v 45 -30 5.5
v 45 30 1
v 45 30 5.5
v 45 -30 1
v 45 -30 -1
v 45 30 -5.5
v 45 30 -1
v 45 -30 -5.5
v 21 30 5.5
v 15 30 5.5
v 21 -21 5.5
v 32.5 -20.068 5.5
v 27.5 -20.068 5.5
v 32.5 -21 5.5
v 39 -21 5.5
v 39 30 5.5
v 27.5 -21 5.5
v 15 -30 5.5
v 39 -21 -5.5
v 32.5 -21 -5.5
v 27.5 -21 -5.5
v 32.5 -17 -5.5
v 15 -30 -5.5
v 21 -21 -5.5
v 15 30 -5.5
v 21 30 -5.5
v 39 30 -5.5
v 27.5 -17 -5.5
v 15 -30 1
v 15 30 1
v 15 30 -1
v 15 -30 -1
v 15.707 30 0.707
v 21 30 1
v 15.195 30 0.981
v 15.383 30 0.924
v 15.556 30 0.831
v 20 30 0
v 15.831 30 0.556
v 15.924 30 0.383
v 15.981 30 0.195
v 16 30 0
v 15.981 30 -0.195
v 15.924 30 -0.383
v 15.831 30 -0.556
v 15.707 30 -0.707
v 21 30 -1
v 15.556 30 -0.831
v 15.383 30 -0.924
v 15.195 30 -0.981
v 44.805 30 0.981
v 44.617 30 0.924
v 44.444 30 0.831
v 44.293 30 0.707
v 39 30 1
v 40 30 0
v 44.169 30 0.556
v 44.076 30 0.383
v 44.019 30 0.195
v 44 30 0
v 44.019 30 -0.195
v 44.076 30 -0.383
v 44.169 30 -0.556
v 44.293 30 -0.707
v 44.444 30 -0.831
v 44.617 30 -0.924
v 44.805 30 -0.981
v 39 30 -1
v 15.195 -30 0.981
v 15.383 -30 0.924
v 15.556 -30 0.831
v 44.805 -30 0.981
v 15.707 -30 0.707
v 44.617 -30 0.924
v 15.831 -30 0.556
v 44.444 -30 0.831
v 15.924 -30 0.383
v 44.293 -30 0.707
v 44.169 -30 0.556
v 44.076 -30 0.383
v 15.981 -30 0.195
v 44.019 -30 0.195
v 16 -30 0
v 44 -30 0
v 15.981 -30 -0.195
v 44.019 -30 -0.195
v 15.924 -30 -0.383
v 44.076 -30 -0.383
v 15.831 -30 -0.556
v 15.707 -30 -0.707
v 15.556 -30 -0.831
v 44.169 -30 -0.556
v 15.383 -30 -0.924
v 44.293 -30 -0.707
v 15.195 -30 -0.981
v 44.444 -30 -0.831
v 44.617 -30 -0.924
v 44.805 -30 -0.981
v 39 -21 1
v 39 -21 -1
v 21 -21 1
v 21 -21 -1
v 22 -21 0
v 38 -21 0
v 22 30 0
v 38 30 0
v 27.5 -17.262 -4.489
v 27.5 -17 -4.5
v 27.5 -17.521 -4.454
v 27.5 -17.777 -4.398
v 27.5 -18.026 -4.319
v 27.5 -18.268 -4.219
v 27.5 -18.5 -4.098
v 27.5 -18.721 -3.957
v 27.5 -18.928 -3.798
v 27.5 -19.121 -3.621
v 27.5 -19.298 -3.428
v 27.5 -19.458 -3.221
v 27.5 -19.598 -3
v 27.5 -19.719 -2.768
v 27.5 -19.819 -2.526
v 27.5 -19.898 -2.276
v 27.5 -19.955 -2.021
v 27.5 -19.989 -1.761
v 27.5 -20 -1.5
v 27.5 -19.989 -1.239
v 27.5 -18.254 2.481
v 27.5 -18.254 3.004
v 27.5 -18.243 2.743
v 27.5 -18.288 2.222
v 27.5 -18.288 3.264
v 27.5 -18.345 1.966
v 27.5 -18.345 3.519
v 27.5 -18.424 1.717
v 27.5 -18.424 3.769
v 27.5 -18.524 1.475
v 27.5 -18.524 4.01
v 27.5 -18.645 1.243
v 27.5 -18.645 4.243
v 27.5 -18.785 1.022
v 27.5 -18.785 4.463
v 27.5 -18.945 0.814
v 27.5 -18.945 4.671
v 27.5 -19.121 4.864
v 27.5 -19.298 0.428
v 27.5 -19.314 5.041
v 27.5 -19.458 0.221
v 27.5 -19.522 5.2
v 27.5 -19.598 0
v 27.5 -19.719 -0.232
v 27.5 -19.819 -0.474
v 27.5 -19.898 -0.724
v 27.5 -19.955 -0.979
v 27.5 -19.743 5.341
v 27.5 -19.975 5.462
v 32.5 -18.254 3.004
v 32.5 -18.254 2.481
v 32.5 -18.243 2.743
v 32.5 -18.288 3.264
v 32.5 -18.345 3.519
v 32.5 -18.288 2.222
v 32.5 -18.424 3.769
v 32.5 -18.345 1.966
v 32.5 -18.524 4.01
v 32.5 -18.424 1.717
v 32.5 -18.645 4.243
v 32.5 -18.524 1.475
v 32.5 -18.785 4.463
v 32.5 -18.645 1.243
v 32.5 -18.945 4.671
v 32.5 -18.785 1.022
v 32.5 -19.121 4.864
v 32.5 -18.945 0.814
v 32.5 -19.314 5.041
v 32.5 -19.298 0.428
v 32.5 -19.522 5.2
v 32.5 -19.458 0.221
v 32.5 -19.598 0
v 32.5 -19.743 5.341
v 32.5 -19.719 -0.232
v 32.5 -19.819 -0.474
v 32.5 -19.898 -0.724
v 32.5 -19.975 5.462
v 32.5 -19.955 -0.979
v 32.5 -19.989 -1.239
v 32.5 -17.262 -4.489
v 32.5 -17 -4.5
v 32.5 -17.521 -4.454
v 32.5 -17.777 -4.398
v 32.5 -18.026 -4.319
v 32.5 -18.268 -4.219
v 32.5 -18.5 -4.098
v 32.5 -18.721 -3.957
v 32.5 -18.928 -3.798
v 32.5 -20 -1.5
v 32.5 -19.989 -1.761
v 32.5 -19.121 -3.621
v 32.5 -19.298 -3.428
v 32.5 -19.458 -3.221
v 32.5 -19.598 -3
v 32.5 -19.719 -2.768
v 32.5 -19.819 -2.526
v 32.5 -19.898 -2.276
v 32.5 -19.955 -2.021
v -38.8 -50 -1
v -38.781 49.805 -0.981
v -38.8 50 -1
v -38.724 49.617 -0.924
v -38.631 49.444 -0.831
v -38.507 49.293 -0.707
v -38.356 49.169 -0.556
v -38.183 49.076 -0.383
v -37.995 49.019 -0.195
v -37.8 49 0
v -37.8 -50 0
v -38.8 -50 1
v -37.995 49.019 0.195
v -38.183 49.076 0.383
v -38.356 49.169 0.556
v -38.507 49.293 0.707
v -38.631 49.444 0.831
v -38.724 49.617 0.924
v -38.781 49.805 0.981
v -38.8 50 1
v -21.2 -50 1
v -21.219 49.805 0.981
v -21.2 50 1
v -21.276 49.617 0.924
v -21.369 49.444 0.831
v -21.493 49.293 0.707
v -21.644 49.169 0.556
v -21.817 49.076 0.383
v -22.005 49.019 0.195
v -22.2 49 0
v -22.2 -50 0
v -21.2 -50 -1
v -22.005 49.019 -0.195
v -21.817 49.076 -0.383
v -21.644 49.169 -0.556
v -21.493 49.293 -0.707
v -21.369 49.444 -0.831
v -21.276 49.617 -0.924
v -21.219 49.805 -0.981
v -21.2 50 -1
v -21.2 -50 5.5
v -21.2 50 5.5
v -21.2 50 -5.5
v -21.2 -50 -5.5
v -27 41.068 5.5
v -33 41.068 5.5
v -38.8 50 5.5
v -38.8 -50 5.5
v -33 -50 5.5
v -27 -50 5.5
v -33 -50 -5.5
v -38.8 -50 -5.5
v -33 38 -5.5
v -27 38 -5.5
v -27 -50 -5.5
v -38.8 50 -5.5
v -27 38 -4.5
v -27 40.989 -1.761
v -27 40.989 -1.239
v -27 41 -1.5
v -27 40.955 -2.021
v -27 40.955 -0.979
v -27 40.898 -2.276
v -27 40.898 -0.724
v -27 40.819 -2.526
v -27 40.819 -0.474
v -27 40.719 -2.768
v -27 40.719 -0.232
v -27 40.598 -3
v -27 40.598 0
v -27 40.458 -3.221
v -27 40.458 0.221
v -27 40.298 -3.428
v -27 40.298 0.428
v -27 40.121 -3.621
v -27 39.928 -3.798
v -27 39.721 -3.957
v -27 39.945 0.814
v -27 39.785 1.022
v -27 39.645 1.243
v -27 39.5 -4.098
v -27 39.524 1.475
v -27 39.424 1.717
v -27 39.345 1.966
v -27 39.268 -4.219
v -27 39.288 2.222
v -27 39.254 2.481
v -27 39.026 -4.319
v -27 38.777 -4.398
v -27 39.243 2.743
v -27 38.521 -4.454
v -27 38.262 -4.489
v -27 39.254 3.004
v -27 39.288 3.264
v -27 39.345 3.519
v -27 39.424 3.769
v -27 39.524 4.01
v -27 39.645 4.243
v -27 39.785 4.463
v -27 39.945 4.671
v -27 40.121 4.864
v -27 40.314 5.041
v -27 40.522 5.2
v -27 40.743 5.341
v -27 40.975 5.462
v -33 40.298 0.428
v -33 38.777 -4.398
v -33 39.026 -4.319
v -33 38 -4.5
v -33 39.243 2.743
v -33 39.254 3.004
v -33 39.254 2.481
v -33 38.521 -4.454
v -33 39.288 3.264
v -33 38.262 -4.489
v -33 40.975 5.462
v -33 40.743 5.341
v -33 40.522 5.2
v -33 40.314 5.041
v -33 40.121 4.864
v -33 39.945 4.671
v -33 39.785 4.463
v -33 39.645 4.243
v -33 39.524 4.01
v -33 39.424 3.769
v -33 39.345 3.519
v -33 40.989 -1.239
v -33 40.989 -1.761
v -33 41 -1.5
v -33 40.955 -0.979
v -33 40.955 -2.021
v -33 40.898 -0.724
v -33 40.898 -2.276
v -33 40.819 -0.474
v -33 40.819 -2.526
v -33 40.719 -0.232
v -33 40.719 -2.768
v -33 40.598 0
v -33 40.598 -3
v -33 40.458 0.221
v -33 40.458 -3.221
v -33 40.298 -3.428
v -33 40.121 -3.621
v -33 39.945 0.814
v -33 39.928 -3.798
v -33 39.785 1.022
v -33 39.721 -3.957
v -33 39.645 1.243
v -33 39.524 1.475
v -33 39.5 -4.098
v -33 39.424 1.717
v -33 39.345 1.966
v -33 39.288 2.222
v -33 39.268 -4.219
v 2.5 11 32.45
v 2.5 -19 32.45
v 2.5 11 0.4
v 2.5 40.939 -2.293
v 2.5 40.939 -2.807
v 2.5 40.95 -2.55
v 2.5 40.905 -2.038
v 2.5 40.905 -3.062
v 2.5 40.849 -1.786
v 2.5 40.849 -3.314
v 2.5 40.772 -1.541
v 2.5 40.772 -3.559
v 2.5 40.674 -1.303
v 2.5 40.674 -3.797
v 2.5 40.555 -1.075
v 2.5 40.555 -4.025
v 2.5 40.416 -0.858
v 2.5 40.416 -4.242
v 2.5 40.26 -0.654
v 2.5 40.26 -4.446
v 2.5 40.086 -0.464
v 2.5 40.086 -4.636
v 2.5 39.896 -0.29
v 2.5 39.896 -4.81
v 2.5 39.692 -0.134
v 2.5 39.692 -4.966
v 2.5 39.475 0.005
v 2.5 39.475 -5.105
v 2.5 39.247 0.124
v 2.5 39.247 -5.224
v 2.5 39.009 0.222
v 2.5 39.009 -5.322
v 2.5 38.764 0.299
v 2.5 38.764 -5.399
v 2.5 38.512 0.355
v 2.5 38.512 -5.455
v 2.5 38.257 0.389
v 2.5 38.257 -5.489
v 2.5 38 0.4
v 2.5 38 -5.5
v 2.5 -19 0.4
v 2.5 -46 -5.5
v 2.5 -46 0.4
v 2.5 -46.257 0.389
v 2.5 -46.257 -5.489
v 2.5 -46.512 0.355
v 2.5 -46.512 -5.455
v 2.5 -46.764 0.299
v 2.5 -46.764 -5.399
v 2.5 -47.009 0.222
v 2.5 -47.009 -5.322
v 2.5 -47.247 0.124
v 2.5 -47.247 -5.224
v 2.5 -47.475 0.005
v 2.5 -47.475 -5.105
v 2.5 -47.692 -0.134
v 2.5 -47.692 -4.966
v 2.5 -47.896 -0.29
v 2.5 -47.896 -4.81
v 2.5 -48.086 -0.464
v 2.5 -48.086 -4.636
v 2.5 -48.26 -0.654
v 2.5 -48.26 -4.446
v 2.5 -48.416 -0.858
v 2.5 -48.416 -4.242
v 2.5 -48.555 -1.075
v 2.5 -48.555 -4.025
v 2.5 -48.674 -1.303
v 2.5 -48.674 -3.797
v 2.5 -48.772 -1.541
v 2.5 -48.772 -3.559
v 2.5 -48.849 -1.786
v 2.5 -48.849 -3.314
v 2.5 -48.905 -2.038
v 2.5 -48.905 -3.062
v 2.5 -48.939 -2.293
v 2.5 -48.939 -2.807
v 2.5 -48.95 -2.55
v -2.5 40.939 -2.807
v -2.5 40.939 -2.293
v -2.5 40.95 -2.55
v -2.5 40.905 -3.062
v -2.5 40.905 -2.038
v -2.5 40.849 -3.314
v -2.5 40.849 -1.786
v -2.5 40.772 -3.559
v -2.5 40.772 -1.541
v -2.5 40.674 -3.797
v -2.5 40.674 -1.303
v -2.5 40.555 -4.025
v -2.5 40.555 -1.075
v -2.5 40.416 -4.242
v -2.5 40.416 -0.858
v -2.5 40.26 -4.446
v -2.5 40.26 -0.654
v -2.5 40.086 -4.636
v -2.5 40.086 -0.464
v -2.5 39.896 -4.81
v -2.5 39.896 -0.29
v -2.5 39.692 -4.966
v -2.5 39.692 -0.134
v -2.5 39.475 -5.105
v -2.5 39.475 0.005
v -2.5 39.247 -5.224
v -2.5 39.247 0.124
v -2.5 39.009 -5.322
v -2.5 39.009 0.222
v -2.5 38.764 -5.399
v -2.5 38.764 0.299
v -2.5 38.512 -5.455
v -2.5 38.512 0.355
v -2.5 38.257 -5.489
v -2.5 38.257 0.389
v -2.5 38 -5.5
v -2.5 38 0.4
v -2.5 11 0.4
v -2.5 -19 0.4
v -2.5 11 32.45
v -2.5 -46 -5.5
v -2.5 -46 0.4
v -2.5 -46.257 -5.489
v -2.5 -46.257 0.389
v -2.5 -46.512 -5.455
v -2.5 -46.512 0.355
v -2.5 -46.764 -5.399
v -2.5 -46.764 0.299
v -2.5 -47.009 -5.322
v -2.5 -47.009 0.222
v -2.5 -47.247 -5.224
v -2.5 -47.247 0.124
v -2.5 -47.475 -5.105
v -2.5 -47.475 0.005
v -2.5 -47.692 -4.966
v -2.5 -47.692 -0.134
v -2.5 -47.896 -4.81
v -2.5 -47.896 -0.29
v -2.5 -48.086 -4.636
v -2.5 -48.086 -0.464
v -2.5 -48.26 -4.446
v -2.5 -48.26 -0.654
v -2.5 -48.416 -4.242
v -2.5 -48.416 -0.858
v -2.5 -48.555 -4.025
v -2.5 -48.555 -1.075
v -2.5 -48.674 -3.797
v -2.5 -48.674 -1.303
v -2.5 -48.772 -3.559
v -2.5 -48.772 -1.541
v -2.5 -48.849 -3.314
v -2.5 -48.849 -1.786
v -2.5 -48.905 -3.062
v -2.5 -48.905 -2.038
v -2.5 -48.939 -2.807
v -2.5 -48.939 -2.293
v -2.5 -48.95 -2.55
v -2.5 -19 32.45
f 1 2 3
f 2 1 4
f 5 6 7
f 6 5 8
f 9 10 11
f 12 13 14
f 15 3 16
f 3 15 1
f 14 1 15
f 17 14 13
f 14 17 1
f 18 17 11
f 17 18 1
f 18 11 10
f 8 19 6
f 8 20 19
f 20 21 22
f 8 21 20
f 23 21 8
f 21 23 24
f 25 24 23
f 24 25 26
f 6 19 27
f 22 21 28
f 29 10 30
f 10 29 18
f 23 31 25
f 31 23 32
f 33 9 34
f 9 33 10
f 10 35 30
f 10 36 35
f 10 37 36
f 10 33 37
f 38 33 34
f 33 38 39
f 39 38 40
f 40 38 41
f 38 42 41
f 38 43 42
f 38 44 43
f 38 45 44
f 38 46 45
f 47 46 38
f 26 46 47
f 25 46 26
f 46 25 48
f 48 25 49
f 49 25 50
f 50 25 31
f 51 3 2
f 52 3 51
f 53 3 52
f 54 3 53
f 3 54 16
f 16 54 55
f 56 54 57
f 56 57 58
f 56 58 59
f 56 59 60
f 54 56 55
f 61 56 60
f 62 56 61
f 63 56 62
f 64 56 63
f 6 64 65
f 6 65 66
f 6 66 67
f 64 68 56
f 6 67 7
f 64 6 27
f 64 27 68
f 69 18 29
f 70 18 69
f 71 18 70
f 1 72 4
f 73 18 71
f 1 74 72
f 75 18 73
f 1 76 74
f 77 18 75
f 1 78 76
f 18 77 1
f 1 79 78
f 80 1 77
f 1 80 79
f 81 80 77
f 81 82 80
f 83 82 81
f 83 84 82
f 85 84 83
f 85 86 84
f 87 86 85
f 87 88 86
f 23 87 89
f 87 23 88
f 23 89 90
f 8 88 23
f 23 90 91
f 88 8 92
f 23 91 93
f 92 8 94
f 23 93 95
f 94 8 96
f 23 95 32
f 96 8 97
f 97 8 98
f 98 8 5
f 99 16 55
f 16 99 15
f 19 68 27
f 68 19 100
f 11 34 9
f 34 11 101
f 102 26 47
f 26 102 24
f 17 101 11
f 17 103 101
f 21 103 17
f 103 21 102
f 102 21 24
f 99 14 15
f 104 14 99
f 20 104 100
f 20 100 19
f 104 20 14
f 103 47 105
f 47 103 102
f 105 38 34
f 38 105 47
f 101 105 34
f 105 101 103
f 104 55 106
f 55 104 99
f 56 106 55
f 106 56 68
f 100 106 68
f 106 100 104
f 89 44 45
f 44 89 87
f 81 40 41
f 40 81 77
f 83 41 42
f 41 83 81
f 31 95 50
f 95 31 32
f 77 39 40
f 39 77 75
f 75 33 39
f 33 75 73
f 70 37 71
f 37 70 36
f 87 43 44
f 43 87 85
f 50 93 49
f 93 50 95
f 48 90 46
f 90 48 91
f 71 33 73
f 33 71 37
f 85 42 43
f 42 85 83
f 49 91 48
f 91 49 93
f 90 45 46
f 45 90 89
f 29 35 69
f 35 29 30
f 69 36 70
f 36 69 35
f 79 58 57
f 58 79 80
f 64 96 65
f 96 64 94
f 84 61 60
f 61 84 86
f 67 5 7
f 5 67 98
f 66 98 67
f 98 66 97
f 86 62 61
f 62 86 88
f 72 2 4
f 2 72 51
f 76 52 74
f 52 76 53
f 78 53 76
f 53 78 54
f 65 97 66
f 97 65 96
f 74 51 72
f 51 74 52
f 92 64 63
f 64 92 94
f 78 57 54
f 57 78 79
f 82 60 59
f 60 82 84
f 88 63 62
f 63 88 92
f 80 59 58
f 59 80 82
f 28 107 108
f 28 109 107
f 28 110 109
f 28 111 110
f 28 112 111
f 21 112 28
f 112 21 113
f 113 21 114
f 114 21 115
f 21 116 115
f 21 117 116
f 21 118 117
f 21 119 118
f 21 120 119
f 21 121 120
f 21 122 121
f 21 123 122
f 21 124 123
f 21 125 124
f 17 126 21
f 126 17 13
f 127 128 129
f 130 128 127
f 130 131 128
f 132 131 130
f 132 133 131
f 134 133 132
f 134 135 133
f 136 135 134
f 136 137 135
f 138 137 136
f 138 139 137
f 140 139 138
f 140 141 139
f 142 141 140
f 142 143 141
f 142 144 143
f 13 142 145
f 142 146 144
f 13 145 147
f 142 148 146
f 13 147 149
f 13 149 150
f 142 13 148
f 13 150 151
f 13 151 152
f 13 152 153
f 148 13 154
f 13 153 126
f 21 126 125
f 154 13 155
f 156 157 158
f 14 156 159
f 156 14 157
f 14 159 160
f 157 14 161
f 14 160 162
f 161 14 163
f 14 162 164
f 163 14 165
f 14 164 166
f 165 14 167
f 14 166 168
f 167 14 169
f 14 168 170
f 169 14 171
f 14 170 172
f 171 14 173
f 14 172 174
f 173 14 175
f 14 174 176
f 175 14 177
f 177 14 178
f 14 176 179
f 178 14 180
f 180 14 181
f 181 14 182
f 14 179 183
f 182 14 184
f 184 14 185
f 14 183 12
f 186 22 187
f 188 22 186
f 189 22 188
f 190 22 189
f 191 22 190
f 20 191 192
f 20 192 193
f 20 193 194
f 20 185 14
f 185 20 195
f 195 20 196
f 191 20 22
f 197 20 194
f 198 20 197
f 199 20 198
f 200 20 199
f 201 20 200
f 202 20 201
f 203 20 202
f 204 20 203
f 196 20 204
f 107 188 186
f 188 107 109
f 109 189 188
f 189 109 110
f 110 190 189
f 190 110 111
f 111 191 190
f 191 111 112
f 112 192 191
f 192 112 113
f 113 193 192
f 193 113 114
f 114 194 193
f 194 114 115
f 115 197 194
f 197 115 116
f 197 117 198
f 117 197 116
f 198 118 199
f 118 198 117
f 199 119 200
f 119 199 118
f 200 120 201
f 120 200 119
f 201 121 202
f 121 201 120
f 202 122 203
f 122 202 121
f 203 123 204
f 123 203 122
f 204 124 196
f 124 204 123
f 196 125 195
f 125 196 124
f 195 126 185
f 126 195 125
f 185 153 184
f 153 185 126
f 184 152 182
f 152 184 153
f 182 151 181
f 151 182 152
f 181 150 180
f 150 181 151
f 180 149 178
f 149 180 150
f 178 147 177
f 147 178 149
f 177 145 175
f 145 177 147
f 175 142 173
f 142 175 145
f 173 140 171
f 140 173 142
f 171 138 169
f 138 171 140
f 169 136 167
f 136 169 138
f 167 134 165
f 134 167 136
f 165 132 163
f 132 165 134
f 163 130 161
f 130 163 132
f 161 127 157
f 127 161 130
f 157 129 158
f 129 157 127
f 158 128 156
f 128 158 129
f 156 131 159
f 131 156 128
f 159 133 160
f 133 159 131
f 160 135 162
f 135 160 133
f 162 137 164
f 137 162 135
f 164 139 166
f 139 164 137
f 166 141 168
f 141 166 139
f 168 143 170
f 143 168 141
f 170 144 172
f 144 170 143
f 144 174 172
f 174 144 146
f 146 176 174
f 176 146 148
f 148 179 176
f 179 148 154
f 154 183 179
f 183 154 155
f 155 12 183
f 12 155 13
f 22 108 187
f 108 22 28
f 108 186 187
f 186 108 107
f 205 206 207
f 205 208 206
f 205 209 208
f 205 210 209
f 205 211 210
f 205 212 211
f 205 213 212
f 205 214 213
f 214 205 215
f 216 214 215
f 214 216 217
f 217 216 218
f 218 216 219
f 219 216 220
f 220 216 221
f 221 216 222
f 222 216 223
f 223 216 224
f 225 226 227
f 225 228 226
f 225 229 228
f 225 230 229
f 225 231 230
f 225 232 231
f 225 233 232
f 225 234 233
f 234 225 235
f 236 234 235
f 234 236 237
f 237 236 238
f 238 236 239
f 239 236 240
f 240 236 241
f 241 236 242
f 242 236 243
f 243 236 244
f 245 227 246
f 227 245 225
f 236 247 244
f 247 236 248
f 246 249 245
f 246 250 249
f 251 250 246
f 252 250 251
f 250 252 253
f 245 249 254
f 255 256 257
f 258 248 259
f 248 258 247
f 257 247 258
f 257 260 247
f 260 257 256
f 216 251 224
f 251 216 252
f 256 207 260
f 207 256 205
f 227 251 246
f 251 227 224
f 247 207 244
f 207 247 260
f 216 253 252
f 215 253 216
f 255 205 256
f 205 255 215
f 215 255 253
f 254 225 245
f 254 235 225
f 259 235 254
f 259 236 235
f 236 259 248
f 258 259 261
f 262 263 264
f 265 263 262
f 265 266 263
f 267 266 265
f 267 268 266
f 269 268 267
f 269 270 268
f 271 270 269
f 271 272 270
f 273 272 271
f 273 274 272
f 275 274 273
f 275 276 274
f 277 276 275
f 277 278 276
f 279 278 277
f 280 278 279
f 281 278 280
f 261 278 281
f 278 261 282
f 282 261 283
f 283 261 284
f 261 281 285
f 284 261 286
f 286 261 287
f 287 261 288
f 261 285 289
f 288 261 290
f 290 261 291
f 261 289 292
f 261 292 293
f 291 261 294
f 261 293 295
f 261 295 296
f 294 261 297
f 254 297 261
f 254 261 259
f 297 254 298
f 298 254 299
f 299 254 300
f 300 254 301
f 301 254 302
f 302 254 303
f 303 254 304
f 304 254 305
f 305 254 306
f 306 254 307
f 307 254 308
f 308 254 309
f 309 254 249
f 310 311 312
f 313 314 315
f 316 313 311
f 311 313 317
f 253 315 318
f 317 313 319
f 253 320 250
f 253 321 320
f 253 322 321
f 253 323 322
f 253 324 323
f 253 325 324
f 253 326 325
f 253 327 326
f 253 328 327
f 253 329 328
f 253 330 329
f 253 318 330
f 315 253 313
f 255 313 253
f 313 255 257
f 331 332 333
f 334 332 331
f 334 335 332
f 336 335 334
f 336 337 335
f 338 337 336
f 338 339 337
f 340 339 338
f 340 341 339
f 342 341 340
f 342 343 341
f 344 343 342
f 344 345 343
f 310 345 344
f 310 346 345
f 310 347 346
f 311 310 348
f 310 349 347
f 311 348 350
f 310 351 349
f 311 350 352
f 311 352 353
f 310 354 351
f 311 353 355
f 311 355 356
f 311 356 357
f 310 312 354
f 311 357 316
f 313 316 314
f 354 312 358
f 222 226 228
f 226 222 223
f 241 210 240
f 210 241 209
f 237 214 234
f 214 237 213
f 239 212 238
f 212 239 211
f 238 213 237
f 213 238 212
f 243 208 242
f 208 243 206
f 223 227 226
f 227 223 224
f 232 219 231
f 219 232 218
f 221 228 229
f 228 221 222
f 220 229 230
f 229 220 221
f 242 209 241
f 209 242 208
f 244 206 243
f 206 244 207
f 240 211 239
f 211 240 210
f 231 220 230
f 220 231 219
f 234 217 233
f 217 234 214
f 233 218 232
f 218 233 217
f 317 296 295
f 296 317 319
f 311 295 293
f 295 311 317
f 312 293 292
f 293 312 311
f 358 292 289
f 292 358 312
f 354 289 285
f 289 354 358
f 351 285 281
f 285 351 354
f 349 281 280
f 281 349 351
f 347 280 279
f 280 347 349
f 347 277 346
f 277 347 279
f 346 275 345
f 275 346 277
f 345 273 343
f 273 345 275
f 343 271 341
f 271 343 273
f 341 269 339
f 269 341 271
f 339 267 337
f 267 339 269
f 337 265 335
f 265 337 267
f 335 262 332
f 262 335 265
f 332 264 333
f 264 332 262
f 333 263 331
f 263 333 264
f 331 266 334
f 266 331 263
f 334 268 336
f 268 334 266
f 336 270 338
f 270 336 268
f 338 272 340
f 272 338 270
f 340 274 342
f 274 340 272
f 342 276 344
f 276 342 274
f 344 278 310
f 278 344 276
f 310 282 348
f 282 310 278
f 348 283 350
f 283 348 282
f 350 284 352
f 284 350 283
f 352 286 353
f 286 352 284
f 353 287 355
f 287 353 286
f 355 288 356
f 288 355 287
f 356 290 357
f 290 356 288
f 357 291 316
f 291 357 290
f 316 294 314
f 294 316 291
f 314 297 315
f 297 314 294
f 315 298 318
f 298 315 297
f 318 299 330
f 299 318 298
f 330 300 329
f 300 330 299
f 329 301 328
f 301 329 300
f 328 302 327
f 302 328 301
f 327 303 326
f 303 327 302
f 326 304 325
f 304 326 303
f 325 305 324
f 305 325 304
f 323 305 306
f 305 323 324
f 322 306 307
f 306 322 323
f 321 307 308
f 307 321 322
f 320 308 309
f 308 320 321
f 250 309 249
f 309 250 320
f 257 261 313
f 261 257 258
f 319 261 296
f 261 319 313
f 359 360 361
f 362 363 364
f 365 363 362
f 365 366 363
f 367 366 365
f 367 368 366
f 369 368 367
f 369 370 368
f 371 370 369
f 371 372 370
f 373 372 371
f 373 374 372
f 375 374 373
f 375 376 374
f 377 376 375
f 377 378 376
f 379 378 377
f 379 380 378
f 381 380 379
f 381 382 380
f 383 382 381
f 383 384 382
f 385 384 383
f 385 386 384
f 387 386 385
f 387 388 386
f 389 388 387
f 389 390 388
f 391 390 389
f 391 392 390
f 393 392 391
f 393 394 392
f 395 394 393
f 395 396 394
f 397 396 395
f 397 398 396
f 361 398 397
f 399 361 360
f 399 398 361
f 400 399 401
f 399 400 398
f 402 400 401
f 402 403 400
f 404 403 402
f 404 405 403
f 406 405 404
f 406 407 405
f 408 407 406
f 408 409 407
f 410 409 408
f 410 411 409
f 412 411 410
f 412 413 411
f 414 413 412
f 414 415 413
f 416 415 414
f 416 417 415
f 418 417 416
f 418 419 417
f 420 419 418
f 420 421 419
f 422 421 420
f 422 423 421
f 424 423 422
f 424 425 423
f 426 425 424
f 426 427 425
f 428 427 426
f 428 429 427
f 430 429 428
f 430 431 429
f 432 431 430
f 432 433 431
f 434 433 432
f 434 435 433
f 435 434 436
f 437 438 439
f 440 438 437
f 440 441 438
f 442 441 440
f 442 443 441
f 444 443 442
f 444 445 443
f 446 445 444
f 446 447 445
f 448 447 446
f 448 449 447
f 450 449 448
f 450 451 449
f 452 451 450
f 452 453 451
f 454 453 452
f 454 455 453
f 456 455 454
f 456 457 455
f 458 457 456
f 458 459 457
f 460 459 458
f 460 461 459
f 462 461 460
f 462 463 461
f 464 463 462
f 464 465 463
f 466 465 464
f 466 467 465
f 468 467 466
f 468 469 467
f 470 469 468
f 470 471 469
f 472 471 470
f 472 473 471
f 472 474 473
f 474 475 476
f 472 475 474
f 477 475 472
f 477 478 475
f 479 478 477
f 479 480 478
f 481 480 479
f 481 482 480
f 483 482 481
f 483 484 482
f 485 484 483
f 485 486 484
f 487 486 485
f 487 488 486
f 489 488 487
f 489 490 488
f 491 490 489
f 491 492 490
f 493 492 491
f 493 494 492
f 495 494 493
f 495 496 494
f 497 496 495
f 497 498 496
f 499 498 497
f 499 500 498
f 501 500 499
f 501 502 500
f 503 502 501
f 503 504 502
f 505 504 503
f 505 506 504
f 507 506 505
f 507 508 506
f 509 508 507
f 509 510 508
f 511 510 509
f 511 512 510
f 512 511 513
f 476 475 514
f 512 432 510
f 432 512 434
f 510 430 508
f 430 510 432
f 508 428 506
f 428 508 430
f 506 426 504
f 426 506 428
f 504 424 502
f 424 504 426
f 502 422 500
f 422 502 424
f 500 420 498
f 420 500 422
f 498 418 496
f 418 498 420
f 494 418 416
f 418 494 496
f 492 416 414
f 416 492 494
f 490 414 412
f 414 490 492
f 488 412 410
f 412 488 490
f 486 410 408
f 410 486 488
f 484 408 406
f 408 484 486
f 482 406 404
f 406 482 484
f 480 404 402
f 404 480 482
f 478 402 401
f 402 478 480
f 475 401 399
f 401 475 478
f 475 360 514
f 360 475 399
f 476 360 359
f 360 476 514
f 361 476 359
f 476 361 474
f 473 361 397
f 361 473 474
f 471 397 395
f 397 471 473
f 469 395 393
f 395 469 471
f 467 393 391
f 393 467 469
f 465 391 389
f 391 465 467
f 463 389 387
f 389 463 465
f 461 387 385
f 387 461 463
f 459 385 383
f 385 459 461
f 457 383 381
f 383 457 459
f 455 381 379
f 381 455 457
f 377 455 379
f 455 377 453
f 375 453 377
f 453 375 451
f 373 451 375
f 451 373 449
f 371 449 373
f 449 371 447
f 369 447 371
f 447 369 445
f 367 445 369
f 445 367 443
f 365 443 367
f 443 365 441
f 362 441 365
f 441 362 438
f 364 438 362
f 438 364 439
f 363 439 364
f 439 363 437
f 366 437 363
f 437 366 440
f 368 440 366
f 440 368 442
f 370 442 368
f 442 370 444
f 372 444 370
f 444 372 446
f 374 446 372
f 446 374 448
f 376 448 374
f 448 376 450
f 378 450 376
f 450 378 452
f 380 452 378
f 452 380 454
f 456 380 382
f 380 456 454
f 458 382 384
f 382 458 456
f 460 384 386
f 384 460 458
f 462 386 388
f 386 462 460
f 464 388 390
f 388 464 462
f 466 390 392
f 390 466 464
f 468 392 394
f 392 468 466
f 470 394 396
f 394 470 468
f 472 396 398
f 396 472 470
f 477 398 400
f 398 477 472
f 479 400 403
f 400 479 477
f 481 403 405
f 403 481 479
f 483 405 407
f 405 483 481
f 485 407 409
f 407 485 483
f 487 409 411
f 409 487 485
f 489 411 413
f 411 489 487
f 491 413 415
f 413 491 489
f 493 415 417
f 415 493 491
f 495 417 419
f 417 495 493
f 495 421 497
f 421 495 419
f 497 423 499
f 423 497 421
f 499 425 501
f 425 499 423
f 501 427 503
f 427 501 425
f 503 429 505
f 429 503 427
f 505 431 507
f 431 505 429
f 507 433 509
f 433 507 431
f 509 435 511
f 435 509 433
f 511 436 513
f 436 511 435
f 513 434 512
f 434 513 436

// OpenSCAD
$fa = 5;
$fs = 0.2;
eps = 0.0001;

module socket() {
  intersection() {
    translate([-4, 0, 0])
      square([11, 4]);
    
    difference() {
      union() {
        rotate([0, 0, -45])
          translate([0, 6, 0])
            circle(3);
        rotate([0, 0, 45])
          square(8);
        translate([-4, 1])
          square(8, center=true);
      }
      circle(3);
    }
  }
}

module ball() {
  circle(2.95);
}

module round_rail(length) {
  rotate([90, 0, 0])
    translate([0, 0, -length/2])
      cylinder(length, 1);
}

module square_rail(length) {
  rotate([90, 45, 0])
    cube([sqrt(2), sqrt(2), length], center=true);
}

module fork1() {
  difference() {
    union() {
      difference() {
        translate([0, 0, 0]) cube([30, 60, 11], center=true);
        translate([0, 9, 0]) cube([18, 60, 12], center=true);
      }
      for (x = [-9, 9])
        translate([x, 4.5, 0])
          square_rail(51+eps);
    }
    for (x = [-15, 15])
      translate([x, 0, 0])
        round_rail(1000);
  }
  
  translate([-2.5, -17-eps, -1.5])
    rotate([180, -90, 0])
      linear_extrude(5)
        socket();
}

module fork2() {
  difference() {
    cube([17.6, 100, 11], center=true);
    translate([0, -8, 0]) cube([6, 100, 12], center=true);
    for (x = [-8.8, 8.8])
      translate([x, 0, 0])
        square_rail(1000);
    translate([0, 50, 0])
      rotate([0, 0, 90])
        round_rail(1000);
  }

  translate([3.5, 38+eps, -1.5])
    rotate([0, -90, 0])
      linear_extrude(7)
        socket();
}

module insert() {
  length = 84;
  translate([2.5, -4, -2.55]) {
    rotate([0, -90, 0]) {
      linear_extrude(5) {
        translate([0, -15, 0])
          square([35, 30]);
        hull()
          for (y = length/2 * [-1, 1])
            translate([0, y, 0])
              ball();
      }
    }
  }
}

module test() {
  translate([0, -29.2, 0]) fork1();
  fork2();
  translate([0, 0, 1.05]) insert();
}

module profile() {
  projection(cut=true)
    rotate([0, 90, 0])
      test();
}

module print() {
  translate([30, 0, 0]) fork1();
  translate([-30, 0, 0]) fork2();
  insert();
}

print();
